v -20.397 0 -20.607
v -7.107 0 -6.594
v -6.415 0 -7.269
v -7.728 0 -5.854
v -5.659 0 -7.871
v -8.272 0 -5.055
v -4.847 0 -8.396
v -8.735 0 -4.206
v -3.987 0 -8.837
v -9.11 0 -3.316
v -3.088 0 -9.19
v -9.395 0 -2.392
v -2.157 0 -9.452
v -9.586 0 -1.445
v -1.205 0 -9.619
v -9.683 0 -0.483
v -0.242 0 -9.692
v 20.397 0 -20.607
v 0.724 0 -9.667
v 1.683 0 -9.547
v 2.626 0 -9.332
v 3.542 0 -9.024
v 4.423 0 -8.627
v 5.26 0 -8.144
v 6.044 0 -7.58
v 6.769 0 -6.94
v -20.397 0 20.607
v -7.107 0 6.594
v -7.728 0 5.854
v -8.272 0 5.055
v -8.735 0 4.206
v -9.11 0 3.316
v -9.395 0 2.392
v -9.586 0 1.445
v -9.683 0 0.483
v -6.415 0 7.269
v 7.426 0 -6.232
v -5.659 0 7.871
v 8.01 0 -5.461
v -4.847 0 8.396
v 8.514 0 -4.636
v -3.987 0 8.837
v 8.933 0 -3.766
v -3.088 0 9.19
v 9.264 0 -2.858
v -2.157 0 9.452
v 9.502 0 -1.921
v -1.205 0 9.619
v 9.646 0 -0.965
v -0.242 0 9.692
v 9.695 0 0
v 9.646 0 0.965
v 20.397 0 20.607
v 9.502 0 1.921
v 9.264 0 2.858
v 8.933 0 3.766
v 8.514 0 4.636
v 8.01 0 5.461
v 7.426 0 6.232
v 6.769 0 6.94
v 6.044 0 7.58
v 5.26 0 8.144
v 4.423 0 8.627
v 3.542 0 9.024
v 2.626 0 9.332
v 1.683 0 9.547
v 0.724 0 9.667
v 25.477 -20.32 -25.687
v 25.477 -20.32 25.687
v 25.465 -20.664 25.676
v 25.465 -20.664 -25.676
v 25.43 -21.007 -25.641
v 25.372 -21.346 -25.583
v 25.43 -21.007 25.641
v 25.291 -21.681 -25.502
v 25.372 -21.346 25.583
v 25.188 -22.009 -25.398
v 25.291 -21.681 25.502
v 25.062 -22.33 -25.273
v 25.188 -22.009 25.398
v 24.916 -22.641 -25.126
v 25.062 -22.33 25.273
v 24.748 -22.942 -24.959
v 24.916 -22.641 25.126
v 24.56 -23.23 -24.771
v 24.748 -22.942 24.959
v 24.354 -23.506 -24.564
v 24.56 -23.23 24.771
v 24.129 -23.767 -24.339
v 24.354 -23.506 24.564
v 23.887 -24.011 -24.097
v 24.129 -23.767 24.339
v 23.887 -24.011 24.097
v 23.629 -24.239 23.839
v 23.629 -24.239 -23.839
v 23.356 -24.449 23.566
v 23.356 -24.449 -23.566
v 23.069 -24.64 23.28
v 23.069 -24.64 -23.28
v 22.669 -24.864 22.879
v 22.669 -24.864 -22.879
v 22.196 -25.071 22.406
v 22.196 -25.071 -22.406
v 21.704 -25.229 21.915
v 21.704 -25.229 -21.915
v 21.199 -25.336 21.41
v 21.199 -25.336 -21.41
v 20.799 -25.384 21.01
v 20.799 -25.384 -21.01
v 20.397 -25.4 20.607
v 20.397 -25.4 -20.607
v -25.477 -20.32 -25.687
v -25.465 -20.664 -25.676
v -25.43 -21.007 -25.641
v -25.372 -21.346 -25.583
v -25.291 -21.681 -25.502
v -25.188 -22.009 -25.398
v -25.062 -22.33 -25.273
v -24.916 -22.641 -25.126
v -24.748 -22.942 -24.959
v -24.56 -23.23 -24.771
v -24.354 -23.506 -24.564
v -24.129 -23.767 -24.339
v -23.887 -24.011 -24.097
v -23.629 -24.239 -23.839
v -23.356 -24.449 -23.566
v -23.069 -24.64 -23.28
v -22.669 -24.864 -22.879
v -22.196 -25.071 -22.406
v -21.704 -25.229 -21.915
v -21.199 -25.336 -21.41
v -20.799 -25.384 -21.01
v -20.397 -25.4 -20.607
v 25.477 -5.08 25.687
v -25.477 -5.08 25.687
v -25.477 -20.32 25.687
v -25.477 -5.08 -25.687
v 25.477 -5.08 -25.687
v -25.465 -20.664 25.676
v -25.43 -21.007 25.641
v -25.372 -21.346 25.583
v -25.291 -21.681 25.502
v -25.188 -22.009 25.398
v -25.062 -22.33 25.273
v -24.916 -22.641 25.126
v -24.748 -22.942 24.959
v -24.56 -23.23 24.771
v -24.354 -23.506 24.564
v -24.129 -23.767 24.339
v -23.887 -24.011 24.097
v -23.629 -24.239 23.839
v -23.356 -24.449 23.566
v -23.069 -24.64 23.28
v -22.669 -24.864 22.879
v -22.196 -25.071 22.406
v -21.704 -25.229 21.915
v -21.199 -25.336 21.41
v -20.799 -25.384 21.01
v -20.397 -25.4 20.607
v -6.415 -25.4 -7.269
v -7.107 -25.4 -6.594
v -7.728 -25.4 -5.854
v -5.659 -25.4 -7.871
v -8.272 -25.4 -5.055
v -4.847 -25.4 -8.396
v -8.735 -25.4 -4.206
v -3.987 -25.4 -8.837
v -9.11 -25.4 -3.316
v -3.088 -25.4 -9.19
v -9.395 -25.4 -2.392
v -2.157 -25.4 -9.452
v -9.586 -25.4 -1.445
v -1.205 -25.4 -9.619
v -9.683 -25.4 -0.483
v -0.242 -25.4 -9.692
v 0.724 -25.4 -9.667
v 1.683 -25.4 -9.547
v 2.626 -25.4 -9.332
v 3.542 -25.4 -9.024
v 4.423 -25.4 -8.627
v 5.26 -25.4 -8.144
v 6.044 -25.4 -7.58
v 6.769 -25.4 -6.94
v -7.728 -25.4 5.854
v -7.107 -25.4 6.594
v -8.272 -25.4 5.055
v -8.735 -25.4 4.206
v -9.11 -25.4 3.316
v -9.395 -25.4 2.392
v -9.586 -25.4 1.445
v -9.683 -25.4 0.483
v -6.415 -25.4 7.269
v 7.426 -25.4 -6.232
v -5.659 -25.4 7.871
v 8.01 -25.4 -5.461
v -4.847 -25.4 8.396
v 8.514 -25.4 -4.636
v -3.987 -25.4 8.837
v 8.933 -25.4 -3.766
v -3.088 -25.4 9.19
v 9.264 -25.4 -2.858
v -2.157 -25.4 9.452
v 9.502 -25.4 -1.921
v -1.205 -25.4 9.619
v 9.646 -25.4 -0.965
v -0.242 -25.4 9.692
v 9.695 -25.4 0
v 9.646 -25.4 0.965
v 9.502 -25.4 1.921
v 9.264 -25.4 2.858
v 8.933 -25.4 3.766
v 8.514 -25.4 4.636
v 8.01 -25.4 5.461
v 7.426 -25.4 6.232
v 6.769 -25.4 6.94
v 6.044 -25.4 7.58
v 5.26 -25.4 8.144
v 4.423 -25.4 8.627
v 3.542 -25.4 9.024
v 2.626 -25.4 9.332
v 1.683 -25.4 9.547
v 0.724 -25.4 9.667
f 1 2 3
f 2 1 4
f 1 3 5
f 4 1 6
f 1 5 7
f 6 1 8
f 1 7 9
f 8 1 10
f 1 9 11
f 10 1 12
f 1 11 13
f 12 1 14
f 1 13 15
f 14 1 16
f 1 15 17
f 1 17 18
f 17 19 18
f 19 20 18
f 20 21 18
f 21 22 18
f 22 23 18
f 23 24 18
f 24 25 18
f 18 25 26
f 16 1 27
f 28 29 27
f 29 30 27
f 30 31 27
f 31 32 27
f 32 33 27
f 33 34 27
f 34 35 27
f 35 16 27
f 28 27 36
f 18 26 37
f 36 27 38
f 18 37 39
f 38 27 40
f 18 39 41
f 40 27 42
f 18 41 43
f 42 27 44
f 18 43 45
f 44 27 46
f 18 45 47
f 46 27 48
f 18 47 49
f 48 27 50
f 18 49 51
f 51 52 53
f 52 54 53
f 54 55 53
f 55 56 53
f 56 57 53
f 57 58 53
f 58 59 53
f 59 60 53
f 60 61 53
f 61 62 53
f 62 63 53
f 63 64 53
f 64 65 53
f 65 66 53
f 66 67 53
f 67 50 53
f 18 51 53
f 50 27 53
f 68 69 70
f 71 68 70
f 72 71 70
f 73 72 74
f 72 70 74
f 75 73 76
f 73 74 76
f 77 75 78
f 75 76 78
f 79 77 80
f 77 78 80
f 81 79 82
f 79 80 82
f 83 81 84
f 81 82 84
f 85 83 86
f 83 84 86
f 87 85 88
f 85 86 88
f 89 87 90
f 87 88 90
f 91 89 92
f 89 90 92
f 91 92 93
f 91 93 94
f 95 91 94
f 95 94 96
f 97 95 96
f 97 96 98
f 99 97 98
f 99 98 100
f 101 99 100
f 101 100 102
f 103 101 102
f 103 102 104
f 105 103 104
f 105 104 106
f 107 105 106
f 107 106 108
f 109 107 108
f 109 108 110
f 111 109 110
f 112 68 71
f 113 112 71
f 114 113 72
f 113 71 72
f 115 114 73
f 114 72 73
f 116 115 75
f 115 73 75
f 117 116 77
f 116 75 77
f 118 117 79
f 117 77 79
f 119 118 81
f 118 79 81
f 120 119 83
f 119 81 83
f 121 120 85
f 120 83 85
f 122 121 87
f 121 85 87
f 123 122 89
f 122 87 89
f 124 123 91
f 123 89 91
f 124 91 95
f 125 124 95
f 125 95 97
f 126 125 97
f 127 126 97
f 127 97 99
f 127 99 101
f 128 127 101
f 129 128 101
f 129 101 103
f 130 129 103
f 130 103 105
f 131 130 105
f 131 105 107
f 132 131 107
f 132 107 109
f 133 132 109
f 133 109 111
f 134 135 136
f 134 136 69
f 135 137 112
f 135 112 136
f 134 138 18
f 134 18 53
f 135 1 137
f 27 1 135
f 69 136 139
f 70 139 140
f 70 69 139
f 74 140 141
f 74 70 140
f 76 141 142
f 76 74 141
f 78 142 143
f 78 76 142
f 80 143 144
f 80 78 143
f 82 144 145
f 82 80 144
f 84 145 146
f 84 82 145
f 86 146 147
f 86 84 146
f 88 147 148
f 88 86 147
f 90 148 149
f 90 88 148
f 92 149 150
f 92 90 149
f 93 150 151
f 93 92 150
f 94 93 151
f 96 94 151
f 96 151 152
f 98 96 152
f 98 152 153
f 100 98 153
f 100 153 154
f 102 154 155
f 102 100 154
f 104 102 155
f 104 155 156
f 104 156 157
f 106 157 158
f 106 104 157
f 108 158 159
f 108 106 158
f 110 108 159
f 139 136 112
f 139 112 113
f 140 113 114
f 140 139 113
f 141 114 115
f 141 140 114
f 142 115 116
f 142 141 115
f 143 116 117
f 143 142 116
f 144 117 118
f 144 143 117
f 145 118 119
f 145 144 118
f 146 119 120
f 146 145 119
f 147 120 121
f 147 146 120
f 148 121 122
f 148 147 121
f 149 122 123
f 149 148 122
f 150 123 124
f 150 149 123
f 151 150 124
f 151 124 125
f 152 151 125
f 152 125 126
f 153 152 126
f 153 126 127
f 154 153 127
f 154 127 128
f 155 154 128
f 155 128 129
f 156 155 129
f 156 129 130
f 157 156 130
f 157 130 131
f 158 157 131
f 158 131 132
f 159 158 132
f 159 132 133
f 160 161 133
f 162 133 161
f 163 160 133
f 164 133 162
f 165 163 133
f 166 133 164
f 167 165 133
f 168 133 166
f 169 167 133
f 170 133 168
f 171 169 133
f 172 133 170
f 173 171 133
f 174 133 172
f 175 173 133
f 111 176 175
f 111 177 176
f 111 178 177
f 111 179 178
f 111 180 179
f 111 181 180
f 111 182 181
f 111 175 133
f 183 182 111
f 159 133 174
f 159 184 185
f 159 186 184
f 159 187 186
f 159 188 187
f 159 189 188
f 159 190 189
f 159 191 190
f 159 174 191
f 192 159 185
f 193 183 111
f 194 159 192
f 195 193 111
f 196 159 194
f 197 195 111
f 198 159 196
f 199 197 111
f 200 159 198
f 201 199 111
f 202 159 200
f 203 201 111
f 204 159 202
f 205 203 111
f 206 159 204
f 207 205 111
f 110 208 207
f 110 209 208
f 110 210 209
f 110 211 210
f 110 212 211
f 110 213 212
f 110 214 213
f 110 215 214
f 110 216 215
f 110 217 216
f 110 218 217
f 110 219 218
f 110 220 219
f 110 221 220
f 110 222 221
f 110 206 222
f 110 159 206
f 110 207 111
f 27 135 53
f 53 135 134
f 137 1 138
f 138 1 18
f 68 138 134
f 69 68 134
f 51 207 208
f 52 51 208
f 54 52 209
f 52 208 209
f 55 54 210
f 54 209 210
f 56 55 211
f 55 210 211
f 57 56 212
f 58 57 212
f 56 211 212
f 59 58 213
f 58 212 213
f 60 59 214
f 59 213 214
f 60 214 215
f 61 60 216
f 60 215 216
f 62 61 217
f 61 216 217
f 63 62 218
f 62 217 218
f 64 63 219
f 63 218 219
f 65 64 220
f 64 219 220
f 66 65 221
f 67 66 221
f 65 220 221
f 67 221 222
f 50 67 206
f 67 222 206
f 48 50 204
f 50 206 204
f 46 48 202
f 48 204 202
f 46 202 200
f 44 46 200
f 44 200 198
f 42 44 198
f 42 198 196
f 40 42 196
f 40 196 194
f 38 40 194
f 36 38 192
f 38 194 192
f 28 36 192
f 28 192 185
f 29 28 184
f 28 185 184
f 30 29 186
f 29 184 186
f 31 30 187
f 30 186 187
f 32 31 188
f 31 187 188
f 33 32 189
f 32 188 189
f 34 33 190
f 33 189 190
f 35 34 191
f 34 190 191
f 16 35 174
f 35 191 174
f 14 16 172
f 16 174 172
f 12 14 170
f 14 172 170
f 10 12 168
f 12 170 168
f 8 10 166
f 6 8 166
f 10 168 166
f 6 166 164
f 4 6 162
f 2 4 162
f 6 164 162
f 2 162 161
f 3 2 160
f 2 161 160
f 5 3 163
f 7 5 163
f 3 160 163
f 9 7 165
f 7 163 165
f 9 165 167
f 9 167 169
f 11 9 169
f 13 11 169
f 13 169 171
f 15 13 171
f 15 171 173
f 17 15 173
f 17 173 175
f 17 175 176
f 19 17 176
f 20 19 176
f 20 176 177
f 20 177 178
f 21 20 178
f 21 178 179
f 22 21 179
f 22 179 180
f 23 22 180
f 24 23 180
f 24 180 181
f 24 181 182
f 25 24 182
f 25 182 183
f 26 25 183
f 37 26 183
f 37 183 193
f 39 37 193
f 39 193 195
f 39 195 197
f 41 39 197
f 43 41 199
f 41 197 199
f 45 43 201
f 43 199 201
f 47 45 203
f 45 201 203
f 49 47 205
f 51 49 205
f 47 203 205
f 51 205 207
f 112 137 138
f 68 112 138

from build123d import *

# Parameters (mm, degrees)
F0_W     = 50.953738
F0_H     = 51.374846
F1_DEPTH = 25.4
F2_R     = 5.08
F3_SIZE  = 5.08
F4_R     = 9.694572
F5_DEPTH = 25.4


with BuildPart() as f1:
    # F0 (on Front) → F1 (new body)
    with BuildSketch(Plane.XZ):
        Rectangle(F0_W, F0_H)
    extrude(amount=F1_DEPTH)

    # F2
    f2_edges = [f1.edges().sort_by_distance(p)[0] for p in [
        (0, -25.4, 25.687423),
        (25.476869, -25.4, 0),
        (0, -25.4, -25.687423),
        (-25.476869, -25.4, 0),
    ]]
    fillet(f2_edges, radius=F2_R)

    # F3
    f3_edges = [f1.edges().sort_by_distance(p)[0] for p in [
        (0, 0, 25.687423),
        (-25.476869, 0, 0),
        (0, 0, -25.687423),
        (25.476869, 0, 0),
    ]]
    chamfer(f3_edges, length=F3_SIZE)

    # F4 (on face) → F5 (cut)
    with BuildSketch(Plane.XZ.offset(25.4)):
        Circle(F4_R)
    extrude(amount=-F5_DEPTH, mode=Mode.SUBTRACT)


solid = f1.part
